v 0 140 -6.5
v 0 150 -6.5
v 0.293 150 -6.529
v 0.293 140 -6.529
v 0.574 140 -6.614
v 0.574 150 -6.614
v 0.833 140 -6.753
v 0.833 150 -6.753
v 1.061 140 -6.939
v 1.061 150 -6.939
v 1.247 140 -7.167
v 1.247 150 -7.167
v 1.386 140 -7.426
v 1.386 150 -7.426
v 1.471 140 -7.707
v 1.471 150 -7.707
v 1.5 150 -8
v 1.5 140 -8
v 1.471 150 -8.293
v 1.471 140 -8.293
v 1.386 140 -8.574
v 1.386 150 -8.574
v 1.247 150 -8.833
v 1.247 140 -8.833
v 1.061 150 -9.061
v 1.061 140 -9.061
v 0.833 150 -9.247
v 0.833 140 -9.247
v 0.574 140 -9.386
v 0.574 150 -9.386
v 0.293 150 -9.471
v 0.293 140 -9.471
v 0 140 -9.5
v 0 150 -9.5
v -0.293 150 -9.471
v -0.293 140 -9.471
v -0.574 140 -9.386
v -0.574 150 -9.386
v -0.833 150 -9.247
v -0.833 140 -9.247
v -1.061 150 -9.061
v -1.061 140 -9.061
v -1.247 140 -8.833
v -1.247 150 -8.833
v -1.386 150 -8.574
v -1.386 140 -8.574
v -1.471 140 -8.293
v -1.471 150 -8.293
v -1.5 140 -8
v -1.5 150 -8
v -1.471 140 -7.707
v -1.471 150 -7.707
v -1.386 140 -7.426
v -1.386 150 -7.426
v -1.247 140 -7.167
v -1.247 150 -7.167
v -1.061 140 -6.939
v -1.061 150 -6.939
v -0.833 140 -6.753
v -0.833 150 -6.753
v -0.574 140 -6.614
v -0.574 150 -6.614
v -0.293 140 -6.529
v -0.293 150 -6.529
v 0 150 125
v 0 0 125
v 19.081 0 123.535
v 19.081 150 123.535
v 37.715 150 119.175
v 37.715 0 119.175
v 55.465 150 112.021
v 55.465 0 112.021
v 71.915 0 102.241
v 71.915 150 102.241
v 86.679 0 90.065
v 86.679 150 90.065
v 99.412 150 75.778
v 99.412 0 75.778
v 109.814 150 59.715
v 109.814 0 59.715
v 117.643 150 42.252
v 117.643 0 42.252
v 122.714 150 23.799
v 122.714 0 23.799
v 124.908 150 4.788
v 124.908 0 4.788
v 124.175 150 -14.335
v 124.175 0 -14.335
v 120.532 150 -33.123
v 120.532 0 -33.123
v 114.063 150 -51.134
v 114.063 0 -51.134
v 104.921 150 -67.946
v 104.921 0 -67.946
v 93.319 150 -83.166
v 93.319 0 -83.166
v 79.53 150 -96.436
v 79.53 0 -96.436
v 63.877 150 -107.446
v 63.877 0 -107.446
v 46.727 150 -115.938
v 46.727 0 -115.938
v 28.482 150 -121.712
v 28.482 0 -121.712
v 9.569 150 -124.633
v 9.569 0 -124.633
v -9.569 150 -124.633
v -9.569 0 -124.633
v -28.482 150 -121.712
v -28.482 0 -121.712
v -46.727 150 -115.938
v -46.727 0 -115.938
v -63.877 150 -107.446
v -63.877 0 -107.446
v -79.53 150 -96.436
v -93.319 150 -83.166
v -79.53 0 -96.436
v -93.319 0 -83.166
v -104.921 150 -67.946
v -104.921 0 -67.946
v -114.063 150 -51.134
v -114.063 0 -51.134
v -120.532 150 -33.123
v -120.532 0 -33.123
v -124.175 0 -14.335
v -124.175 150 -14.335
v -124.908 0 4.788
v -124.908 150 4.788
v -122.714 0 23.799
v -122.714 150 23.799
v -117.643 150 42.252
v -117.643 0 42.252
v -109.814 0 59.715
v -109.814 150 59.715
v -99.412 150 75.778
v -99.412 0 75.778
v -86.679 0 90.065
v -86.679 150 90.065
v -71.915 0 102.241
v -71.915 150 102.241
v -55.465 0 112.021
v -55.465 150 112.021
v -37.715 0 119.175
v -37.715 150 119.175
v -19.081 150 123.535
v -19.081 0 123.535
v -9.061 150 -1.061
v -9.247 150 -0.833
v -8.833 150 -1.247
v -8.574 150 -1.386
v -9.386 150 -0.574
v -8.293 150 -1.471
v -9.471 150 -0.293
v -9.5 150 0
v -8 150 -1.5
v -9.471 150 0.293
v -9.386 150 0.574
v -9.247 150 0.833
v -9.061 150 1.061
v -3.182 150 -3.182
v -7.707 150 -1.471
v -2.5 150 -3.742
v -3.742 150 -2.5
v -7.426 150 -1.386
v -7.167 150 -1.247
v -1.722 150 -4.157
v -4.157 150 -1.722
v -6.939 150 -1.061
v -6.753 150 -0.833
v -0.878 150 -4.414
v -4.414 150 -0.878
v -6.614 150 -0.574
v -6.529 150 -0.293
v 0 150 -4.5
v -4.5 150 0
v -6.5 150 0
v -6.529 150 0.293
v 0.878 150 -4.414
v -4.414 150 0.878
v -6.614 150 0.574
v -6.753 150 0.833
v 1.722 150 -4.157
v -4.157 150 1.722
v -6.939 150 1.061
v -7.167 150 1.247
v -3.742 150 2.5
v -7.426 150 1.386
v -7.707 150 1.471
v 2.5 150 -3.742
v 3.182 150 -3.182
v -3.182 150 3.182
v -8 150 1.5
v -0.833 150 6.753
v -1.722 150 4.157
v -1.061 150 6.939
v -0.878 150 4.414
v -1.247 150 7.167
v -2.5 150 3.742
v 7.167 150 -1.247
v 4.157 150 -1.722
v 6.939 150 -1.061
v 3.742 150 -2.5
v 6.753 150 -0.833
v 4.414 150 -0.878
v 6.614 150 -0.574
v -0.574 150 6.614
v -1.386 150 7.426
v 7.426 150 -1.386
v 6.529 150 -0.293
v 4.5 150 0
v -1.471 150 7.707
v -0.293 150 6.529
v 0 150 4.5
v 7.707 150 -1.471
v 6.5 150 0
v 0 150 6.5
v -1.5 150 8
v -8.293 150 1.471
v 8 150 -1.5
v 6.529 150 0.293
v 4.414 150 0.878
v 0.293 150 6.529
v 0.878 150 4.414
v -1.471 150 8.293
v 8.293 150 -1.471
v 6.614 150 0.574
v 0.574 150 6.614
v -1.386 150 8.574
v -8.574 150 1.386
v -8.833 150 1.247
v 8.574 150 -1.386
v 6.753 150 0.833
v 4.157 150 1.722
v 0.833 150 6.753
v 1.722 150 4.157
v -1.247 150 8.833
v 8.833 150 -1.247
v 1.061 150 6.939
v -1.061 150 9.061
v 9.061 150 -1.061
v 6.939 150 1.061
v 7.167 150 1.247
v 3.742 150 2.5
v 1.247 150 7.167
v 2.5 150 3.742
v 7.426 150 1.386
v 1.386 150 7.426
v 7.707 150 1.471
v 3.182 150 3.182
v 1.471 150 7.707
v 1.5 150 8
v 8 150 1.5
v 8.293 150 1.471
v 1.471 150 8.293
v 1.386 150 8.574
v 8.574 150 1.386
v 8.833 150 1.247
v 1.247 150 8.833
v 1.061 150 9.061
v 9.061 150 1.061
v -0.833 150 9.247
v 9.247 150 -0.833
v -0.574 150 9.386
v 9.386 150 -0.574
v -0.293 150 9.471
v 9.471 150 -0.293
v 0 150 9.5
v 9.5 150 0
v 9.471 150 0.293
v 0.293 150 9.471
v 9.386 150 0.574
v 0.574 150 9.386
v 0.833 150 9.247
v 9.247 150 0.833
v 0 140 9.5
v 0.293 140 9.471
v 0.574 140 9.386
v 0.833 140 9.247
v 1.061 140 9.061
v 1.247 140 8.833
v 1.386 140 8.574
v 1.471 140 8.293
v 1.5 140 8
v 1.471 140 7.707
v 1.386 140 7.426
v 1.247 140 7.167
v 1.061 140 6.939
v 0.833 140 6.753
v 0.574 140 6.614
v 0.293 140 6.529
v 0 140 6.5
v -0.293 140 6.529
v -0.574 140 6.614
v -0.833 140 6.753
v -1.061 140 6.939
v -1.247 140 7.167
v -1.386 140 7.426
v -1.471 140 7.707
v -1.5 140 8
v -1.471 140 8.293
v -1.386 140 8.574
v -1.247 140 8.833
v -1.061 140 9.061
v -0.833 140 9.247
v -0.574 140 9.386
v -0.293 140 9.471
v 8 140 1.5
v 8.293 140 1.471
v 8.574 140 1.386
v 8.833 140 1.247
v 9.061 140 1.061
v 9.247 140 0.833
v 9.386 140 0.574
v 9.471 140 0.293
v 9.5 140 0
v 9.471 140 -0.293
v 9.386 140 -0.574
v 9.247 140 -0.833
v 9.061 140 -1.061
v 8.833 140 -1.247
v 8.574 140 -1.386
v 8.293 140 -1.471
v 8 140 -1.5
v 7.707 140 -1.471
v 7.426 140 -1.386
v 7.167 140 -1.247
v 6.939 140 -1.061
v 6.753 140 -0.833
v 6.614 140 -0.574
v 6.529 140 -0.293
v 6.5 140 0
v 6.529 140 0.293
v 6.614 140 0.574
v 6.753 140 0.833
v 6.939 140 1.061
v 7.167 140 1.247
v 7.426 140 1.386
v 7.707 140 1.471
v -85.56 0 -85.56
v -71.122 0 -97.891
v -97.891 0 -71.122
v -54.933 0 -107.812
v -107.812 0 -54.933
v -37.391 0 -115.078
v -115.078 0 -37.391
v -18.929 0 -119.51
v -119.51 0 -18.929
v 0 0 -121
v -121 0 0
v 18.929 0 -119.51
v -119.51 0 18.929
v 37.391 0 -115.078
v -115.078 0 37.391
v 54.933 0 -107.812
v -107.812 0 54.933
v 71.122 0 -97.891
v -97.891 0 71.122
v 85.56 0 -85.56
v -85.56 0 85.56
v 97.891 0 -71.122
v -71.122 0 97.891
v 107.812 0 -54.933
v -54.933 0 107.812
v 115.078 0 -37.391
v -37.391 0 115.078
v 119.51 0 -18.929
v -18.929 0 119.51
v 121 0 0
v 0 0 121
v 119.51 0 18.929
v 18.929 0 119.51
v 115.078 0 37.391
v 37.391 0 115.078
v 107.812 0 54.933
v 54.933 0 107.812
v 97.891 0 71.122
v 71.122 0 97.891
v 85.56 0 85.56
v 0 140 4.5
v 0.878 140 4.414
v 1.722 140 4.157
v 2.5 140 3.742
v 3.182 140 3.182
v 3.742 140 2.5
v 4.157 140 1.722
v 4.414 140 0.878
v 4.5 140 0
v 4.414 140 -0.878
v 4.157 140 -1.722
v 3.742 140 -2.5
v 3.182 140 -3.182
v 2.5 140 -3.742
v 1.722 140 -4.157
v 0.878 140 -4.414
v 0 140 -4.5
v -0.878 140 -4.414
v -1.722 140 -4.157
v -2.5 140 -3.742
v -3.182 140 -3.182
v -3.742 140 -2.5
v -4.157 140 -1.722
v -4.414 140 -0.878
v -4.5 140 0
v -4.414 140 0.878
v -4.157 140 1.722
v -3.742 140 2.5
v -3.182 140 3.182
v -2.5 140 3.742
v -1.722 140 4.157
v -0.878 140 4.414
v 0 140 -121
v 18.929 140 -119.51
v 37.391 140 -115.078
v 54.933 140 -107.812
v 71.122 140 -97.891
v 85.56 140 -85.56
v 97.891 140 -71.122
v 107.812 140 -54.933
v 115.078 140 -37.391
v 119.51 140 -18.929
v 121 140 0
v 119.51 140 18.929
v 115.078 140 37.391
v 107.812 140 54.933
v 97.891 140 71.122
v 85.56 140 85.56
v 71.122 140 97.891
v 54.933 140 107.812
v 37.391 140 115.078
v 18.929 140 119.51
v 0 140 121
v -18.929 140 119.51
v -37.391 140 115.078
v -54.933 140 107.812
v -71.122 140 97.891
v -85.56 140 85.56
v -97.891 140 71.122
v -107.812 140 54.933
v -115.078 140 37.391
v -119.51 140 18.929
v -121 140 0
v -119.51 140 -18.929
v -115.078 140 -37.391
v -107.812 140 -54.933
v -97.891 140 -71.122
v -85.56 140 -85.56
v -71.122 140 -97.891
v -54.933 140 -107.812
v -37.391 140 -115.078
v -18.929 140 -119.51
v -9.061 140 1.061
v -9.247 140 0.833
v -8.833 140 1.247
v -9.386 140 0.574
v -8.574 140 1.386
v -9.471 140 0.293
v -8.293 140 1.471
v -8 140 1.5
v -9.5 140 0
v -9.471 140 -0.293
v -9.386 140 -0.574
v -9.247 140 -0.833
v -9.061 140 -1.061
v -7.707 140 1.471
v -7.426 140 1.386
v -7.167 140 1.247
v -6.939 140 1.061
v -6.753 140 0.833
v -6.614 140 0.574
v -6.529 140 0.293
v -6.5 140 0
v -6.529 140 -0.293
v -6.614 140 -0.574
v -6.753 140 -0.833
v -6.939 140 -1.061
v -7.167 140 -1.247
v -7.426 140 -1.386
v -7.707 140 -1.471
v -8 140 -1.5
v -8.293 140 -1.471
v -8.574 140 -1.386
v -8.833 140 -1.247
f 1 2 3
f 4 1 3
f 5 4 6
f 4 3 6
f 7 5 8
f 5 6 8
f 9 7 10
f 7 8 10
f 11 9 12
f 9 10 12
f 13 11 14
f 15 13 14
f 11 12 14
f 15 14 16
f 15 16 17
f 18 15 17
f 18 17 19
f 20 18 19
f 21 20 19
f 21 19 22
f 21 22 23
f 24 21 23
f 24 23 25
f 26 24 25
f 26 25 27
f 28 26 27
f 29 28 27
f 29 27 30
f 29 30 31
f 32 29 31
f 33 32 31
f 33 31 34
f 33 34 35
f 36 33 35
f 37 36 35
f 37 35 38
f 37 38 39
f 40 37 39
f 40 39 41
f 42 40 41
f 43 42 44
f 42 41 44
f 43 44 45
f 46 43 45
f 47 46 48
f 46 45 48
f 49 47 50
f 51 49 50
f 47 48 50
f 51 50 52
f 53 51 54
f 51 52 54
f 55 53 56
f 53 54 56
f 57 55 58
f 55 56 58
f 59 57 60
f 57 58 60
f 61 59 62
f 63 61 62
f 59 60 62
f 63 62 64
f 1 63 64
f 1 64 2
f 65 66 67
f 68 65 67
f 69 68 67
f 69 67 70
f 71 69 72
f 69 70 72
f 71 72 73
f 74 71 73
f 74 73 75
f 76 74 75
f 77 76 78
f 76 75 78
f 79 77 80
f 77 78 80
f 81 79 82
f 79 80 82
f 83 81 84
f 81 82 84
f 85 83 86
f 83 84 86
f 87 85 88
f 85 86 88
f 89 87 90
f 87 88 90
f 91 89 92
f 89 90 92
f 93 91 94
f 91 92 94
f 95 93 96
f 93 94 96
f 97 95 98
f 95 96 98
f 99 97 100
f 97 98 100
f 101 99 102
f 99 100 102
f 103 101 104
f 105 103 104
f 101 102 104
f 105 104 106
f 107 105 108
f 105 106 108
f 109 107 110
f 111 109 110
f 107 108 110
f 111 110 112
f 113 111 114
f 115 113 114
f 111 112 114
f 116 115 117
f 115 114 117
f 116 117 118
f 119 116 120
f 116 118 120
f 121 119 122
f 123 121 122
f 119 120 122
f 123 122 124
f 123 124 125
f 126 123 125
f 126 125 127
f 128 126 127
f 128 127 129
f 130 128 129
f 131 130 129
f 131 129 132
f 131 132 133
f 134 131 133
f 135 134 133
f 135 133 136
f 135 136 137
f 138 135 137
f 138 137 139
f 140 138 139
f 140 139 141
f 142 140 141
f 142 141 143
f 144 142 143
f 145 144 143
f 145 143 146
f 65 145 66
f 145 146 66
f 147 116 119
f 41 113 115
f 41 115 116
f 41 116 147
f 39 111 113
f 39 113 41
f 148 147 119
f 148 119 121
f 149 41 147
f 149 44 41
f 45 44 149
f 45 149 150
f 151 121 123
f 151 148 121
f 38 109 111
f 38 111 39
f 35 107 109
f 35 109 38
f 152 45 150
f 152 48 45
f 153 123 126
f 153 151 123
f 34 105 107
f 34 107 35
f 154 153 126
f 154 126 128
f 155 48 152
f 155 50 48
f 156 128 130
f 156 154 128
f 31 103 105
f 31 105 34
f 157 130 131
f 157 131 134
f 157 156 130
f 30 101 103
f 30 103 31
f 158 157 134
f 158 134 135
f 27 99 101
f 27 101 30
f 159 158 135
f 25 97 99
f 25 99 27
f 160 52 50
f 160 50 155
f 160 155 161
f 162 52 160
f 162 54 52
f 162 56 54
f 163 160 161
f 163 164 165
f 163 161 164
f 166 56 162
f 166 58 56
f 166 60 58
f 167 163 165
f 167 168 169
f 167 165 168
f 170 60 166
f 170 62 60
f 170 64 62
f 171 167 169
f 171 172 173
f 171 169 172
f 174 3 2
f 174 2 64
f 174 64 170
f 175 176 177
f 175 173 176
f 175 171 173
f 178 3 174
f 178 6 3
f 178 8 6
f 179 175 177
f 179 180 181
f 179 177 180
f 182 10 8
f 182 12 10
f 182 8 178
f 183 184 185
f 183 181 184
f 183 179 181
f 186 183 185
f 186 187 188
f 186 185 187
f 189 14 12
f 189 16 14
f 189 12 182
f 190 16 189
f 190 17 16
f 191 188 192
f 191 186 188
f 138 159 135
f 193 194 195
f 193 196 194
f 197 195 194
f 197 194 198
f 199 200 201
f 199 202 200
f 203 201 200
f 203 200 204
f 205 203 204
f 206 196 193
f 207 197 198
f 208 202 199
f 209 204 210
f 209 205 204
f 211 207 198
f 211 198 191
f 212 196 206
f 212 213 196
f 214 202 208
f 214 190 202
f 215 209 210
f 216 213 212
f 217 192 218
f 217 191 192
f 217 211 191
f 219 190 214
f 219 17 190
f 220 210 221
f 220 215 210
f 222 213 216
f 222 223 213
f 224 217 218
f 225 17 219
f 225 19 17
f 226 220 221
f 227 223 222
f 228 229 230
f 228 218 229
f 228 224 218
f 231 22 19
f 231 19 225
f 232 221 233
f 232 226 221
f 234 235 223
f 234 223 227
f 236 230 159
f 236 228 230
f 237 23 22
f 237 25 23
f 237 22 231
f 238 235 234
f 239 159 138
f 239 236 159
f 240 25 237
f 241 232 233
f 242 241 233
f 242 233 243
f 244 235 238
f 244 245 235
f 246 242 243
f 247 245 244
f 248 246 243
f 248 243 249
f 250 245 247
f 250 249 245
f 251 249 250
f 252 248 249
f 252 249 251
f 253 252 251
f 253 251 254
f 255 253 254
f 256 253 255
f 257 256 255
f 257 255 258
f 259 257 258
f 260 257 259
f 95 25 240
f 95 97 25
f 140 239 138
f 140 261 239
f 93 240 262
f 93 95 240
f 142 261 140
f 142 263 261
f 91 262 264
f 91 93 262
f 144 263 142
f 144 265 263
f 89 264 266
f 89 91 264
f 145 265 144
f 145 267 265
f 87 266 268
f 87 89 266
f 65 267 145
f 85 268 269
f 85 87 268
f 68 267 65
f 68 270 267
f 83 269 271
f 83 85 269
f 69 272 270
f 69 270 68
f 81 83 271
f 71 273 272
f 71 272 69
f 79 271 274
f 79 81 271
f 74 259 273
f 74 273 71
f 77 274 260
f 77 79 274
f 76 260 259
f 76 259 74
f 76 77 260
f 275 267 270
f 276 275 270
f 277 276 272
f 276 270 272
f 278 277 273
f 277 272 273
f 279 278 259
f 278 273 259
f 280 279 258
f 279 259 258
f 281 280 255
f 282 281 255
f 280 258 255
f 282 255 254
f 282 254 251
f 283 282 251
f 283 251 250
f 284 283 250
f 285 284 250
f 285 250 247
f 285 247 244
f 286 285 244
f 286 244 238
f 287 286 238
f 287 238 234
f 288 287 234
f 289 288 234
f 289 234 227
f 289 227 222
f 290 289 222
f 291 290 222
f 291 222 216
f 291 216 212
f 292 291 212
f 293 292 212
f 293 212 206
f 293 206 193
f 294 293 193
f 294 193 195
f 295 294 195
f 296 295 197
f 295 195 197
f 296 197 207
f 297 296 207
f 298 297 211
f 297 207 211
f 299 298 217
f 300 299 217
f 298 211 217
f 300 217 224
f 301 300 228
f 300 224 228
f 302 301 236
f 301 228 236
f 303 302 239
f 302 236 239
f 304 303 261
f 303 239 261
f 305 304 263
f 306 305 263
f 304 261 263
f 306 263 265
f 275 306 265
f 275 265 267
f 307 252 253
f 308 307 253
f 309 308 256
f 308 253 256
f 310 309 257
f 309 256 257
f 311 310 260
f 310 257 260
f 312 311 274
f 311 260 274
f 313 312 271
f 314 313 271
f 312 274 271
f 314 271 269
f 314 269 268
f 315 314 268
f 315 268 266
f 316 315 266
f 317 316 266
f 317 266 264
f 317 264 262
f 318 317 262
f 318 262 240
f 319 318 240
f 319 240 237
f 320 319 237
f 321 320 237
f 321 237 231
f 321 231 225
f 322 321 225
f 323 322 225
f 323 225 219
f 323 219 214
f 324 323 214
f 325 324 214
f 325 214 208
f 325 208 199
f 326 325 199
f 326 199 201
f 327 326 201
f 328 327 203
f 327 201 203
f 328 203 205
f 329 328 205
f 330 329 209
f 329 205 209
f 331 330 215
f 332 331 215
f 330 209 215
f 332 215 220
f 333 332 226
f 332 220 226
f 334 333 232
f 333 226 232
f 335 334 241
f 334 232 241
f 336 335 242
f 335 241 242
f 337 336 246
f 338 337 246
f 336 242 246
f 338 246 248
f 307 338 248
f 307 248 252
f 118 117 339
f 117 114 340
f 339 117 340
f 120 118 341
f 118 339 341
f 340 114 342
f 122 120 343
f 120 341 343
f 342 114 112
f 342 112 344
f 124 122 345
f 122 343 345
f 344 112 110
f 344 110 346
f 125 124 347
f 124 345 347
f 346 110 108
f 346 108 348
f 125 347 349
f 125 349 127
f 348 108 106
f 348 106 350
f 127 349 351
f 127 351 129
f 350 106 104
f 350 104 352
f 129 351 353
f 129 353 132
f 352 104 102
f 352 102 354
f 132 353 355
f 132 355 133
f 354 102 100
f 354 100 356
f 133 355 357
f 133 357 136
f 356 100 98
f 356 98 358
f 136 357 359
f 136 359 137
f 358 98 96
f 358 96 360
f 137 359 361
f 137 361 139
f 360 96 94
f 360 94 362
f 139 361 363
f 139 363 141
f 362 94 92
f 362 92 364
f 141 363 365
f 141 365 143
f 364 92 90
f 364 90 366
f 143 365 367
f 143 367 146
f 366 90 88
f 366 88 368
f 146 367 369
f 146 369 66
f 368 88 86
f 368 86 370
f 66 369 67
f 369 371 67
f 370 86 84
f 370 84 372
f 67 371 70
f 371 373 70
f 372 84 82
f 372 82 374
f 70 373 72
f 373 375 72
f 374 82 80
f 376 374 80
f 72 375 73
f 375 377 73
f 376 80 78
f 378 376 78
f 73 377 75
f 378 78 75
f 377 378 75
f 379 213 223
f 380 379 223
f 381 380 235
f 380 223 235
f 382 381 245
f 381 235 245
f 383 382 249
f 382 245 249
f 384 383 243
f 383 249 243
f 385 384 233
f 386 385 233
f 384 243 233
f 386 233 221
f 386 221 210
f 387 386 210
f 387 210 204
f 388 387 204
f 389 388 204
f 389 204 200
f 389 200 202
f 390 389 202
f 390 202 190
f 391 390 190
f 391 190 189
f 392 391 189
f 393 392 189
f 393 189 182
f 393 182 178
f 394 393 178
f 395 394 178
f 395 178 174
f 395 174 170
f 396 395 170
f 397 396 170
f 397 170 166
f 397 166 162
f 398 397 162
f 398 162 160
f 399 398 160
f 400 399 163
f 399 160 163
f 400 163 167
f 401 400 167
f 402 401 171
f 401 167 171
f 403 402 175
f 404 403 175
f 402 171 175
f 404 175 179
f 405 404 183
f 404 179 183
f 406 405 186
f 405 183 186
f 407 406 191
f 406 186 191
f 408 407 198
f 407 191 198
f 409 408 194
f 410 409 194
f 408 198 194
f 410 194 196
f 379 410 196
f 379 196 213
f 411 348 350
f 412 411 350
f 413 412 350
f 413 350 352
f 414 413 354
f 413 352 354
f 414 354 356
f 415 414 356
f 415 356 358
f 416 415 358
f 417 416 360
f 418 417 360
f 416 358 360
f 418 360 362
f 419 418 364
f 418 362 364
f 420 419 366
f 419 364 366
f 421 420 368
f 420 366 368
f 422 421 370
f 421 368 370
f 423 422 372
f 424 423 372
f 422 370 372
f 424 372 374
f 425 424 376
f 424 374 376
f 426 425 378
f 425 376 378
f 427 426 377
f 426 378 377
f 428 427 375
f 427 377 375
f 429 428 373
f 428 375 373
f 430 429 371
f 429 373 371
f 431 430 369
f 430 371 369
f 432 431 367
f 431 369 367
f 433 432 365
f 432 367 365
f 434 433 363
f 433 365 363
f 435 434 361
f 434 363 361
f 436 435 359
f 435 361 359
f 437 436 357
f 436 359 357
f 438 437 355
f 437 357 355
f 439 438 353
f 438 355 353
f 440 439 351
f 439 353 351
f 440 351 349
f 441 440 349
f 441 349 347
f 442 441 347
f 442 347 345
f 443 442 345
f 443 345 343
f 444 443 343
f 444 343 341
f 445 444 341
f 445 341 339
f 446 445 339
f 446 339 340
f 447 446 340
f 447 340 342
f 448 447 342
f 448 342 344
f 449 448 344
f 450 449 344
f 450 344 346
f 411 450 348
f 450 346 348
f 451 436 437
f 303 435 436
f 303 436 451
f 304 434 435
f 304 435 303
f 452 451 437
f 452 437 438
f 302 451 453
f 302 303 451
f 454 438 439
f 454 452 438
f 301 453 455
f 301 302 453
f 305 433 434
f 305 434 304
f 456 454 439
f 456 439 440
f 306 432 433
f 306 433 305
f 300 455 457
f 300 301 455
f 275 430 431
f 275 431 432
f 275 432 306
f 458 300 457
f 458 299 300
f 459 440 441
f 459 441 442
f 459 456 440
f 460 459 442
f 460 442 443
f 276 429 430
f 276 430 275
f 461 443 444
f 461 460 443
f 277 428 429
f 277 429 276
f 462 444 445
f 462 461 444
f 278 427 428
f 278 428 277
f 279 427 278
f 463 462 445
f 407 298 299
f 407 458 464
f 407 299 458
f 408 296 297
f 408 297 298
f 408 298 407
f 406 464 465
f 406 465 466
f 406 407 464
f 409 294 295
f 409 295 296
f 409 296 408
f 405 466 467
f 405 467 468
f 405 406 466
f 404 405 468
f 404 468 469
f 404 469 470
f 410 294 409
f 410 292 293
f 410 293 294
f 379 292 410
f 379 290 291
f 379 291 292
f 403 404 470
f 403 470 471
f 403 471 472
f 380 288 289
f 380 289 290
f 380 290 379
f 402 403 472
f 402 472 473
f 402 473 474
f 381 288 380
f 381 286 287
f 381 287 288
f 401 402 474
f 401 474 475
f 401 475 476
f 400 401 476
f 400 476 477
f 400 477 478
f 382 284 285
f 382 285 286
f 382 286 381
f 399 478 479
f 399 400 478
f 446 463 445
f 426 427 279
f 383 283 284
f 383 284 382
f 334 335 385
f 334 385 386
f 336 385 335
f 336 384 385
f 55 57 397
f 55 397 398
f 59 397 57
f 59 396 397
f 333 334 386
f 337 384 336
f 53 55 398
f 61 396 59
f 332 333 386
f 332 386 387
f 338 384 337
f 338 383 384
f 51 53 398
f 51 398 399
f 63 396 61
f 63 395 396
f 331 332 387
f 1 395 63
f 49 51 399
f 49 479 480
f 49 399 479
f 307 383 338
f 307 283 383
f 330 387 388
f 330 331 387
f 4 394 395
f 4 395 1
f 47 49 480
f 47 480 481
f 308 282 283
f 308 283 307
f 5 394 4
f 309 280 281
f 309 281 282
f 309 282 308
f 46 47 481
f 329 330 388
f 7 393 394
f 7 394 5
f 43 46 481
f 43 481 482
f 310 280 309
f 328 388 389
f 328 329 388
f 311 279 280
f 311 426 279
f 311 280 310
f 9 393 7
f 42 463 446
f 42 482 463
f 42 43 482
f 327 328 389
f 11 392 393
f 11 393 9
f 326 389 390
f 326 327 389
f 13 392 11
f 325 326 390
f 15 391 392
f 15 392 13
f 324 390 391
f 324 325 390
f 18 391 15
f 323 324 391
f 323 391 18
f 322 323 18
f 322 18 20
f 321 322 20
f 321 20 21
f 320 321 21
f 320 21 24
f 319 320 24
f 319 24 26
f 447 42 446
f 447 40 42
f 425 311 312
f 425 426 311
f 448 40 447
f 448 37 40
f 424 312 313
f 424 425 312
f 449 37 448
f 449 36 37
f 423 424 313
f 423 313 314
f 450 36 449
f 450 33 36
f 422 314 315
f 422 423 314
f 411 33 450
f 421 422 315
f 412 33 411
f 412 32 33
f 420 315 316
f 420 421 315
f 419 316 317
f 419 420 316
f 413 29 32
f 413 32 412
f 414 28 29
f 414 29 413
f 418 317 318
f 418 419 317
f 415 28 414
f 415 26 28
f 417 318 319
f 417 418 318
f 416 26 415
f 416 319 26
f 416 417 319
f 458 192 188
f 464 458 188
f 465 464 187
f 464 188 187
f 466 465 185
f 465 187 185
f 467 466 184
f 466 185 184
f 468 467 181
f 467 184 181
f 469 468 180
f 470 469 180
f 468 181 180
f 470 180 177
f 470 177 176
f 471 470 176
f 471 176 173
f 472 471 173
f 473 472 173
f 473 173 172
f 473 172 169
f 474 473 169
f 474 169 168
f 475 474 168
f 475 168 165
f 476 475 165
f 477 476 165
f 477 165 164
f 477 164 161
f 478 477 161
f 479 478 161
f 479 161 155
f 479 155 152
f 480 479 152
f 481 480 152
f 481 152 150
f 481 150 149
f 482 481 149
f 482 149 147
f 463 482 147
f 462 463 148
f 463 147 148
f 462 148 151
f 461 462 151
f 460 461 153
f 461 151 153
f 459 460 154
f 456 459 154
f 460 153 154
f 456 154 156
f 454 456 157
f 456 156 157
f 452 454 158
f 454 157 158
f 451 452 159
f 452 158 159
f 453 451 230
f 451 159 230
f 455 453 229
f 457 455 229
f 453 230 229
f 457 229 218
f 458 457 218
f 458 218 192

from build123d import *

# Parameters (mm, degrees)
SKETCH1_R           = 125
BOSS_EXTRUDE1_DEPTH = 150
SKETCH2_R           = 121
CUT_EXTRUDE1_DEPTH  = 140
SKETCH3_R           = 1.5
SKETCH3_R_2         = 4.5
CUT_EXTRUDE2_DEPTH  = 232.840462387


with BuildPart() as part:
    # Sketch1 → Boss-Extrude1 (new body)
    with BuildSketch(Plane(origin=(0, 0, 0), x_dir=(1, 0, 0), z_dir=(0, 1, 0))):
        with Locations(Location((0, 0, 0), (0, 0, 270))):
            Circle(SKETCH1_R)
    extrude(amount=BOSS_EXTRUDE1_DEPTH)

    # Sketch2 → Cut-Extrude1 (cut)
    with BuildSketch(Plane.XZ):
        with Locations(Location((0, 0, 0), (0, 0, 270))):
            Circle(SKETCH2_R)
    extrude(amount=-CUT_EXTRUDE1_DEPTH, mode=Mode.SUBTRACT)

    # Sketch3 → Cut-Extrude2 (cut, through all)
    with BuildSketch(Plane(origin=(0, 150, 0), x_dir=(1, 0, 0), z_dir=(0, 1, 0))):
        with Locations(Location((-8, 0, 0), (0, 0, 270))):
            Circle(SKETCH3_R)
        with Locations(Location((0, 0, 0), (0, 0, 270))):
            Circle(SKETCH3_R_2)
        with Locations(Location((0, 8, 0), (0, 0, 270))):
            Circle(SKETCH3_R)
        with Locations(Location((8, 0, 0), (0, 0, 270))):
            Circle(SKETCH3_R)
        with Locations(Location((0, -8, 0), (0, 0, 270))):
            Circle(SKETCH3_R)
    extrude(amount=-CUT_EXTRUDE2_DEPTH, mode=Mode.SUBTRACT)


solid = part.part
